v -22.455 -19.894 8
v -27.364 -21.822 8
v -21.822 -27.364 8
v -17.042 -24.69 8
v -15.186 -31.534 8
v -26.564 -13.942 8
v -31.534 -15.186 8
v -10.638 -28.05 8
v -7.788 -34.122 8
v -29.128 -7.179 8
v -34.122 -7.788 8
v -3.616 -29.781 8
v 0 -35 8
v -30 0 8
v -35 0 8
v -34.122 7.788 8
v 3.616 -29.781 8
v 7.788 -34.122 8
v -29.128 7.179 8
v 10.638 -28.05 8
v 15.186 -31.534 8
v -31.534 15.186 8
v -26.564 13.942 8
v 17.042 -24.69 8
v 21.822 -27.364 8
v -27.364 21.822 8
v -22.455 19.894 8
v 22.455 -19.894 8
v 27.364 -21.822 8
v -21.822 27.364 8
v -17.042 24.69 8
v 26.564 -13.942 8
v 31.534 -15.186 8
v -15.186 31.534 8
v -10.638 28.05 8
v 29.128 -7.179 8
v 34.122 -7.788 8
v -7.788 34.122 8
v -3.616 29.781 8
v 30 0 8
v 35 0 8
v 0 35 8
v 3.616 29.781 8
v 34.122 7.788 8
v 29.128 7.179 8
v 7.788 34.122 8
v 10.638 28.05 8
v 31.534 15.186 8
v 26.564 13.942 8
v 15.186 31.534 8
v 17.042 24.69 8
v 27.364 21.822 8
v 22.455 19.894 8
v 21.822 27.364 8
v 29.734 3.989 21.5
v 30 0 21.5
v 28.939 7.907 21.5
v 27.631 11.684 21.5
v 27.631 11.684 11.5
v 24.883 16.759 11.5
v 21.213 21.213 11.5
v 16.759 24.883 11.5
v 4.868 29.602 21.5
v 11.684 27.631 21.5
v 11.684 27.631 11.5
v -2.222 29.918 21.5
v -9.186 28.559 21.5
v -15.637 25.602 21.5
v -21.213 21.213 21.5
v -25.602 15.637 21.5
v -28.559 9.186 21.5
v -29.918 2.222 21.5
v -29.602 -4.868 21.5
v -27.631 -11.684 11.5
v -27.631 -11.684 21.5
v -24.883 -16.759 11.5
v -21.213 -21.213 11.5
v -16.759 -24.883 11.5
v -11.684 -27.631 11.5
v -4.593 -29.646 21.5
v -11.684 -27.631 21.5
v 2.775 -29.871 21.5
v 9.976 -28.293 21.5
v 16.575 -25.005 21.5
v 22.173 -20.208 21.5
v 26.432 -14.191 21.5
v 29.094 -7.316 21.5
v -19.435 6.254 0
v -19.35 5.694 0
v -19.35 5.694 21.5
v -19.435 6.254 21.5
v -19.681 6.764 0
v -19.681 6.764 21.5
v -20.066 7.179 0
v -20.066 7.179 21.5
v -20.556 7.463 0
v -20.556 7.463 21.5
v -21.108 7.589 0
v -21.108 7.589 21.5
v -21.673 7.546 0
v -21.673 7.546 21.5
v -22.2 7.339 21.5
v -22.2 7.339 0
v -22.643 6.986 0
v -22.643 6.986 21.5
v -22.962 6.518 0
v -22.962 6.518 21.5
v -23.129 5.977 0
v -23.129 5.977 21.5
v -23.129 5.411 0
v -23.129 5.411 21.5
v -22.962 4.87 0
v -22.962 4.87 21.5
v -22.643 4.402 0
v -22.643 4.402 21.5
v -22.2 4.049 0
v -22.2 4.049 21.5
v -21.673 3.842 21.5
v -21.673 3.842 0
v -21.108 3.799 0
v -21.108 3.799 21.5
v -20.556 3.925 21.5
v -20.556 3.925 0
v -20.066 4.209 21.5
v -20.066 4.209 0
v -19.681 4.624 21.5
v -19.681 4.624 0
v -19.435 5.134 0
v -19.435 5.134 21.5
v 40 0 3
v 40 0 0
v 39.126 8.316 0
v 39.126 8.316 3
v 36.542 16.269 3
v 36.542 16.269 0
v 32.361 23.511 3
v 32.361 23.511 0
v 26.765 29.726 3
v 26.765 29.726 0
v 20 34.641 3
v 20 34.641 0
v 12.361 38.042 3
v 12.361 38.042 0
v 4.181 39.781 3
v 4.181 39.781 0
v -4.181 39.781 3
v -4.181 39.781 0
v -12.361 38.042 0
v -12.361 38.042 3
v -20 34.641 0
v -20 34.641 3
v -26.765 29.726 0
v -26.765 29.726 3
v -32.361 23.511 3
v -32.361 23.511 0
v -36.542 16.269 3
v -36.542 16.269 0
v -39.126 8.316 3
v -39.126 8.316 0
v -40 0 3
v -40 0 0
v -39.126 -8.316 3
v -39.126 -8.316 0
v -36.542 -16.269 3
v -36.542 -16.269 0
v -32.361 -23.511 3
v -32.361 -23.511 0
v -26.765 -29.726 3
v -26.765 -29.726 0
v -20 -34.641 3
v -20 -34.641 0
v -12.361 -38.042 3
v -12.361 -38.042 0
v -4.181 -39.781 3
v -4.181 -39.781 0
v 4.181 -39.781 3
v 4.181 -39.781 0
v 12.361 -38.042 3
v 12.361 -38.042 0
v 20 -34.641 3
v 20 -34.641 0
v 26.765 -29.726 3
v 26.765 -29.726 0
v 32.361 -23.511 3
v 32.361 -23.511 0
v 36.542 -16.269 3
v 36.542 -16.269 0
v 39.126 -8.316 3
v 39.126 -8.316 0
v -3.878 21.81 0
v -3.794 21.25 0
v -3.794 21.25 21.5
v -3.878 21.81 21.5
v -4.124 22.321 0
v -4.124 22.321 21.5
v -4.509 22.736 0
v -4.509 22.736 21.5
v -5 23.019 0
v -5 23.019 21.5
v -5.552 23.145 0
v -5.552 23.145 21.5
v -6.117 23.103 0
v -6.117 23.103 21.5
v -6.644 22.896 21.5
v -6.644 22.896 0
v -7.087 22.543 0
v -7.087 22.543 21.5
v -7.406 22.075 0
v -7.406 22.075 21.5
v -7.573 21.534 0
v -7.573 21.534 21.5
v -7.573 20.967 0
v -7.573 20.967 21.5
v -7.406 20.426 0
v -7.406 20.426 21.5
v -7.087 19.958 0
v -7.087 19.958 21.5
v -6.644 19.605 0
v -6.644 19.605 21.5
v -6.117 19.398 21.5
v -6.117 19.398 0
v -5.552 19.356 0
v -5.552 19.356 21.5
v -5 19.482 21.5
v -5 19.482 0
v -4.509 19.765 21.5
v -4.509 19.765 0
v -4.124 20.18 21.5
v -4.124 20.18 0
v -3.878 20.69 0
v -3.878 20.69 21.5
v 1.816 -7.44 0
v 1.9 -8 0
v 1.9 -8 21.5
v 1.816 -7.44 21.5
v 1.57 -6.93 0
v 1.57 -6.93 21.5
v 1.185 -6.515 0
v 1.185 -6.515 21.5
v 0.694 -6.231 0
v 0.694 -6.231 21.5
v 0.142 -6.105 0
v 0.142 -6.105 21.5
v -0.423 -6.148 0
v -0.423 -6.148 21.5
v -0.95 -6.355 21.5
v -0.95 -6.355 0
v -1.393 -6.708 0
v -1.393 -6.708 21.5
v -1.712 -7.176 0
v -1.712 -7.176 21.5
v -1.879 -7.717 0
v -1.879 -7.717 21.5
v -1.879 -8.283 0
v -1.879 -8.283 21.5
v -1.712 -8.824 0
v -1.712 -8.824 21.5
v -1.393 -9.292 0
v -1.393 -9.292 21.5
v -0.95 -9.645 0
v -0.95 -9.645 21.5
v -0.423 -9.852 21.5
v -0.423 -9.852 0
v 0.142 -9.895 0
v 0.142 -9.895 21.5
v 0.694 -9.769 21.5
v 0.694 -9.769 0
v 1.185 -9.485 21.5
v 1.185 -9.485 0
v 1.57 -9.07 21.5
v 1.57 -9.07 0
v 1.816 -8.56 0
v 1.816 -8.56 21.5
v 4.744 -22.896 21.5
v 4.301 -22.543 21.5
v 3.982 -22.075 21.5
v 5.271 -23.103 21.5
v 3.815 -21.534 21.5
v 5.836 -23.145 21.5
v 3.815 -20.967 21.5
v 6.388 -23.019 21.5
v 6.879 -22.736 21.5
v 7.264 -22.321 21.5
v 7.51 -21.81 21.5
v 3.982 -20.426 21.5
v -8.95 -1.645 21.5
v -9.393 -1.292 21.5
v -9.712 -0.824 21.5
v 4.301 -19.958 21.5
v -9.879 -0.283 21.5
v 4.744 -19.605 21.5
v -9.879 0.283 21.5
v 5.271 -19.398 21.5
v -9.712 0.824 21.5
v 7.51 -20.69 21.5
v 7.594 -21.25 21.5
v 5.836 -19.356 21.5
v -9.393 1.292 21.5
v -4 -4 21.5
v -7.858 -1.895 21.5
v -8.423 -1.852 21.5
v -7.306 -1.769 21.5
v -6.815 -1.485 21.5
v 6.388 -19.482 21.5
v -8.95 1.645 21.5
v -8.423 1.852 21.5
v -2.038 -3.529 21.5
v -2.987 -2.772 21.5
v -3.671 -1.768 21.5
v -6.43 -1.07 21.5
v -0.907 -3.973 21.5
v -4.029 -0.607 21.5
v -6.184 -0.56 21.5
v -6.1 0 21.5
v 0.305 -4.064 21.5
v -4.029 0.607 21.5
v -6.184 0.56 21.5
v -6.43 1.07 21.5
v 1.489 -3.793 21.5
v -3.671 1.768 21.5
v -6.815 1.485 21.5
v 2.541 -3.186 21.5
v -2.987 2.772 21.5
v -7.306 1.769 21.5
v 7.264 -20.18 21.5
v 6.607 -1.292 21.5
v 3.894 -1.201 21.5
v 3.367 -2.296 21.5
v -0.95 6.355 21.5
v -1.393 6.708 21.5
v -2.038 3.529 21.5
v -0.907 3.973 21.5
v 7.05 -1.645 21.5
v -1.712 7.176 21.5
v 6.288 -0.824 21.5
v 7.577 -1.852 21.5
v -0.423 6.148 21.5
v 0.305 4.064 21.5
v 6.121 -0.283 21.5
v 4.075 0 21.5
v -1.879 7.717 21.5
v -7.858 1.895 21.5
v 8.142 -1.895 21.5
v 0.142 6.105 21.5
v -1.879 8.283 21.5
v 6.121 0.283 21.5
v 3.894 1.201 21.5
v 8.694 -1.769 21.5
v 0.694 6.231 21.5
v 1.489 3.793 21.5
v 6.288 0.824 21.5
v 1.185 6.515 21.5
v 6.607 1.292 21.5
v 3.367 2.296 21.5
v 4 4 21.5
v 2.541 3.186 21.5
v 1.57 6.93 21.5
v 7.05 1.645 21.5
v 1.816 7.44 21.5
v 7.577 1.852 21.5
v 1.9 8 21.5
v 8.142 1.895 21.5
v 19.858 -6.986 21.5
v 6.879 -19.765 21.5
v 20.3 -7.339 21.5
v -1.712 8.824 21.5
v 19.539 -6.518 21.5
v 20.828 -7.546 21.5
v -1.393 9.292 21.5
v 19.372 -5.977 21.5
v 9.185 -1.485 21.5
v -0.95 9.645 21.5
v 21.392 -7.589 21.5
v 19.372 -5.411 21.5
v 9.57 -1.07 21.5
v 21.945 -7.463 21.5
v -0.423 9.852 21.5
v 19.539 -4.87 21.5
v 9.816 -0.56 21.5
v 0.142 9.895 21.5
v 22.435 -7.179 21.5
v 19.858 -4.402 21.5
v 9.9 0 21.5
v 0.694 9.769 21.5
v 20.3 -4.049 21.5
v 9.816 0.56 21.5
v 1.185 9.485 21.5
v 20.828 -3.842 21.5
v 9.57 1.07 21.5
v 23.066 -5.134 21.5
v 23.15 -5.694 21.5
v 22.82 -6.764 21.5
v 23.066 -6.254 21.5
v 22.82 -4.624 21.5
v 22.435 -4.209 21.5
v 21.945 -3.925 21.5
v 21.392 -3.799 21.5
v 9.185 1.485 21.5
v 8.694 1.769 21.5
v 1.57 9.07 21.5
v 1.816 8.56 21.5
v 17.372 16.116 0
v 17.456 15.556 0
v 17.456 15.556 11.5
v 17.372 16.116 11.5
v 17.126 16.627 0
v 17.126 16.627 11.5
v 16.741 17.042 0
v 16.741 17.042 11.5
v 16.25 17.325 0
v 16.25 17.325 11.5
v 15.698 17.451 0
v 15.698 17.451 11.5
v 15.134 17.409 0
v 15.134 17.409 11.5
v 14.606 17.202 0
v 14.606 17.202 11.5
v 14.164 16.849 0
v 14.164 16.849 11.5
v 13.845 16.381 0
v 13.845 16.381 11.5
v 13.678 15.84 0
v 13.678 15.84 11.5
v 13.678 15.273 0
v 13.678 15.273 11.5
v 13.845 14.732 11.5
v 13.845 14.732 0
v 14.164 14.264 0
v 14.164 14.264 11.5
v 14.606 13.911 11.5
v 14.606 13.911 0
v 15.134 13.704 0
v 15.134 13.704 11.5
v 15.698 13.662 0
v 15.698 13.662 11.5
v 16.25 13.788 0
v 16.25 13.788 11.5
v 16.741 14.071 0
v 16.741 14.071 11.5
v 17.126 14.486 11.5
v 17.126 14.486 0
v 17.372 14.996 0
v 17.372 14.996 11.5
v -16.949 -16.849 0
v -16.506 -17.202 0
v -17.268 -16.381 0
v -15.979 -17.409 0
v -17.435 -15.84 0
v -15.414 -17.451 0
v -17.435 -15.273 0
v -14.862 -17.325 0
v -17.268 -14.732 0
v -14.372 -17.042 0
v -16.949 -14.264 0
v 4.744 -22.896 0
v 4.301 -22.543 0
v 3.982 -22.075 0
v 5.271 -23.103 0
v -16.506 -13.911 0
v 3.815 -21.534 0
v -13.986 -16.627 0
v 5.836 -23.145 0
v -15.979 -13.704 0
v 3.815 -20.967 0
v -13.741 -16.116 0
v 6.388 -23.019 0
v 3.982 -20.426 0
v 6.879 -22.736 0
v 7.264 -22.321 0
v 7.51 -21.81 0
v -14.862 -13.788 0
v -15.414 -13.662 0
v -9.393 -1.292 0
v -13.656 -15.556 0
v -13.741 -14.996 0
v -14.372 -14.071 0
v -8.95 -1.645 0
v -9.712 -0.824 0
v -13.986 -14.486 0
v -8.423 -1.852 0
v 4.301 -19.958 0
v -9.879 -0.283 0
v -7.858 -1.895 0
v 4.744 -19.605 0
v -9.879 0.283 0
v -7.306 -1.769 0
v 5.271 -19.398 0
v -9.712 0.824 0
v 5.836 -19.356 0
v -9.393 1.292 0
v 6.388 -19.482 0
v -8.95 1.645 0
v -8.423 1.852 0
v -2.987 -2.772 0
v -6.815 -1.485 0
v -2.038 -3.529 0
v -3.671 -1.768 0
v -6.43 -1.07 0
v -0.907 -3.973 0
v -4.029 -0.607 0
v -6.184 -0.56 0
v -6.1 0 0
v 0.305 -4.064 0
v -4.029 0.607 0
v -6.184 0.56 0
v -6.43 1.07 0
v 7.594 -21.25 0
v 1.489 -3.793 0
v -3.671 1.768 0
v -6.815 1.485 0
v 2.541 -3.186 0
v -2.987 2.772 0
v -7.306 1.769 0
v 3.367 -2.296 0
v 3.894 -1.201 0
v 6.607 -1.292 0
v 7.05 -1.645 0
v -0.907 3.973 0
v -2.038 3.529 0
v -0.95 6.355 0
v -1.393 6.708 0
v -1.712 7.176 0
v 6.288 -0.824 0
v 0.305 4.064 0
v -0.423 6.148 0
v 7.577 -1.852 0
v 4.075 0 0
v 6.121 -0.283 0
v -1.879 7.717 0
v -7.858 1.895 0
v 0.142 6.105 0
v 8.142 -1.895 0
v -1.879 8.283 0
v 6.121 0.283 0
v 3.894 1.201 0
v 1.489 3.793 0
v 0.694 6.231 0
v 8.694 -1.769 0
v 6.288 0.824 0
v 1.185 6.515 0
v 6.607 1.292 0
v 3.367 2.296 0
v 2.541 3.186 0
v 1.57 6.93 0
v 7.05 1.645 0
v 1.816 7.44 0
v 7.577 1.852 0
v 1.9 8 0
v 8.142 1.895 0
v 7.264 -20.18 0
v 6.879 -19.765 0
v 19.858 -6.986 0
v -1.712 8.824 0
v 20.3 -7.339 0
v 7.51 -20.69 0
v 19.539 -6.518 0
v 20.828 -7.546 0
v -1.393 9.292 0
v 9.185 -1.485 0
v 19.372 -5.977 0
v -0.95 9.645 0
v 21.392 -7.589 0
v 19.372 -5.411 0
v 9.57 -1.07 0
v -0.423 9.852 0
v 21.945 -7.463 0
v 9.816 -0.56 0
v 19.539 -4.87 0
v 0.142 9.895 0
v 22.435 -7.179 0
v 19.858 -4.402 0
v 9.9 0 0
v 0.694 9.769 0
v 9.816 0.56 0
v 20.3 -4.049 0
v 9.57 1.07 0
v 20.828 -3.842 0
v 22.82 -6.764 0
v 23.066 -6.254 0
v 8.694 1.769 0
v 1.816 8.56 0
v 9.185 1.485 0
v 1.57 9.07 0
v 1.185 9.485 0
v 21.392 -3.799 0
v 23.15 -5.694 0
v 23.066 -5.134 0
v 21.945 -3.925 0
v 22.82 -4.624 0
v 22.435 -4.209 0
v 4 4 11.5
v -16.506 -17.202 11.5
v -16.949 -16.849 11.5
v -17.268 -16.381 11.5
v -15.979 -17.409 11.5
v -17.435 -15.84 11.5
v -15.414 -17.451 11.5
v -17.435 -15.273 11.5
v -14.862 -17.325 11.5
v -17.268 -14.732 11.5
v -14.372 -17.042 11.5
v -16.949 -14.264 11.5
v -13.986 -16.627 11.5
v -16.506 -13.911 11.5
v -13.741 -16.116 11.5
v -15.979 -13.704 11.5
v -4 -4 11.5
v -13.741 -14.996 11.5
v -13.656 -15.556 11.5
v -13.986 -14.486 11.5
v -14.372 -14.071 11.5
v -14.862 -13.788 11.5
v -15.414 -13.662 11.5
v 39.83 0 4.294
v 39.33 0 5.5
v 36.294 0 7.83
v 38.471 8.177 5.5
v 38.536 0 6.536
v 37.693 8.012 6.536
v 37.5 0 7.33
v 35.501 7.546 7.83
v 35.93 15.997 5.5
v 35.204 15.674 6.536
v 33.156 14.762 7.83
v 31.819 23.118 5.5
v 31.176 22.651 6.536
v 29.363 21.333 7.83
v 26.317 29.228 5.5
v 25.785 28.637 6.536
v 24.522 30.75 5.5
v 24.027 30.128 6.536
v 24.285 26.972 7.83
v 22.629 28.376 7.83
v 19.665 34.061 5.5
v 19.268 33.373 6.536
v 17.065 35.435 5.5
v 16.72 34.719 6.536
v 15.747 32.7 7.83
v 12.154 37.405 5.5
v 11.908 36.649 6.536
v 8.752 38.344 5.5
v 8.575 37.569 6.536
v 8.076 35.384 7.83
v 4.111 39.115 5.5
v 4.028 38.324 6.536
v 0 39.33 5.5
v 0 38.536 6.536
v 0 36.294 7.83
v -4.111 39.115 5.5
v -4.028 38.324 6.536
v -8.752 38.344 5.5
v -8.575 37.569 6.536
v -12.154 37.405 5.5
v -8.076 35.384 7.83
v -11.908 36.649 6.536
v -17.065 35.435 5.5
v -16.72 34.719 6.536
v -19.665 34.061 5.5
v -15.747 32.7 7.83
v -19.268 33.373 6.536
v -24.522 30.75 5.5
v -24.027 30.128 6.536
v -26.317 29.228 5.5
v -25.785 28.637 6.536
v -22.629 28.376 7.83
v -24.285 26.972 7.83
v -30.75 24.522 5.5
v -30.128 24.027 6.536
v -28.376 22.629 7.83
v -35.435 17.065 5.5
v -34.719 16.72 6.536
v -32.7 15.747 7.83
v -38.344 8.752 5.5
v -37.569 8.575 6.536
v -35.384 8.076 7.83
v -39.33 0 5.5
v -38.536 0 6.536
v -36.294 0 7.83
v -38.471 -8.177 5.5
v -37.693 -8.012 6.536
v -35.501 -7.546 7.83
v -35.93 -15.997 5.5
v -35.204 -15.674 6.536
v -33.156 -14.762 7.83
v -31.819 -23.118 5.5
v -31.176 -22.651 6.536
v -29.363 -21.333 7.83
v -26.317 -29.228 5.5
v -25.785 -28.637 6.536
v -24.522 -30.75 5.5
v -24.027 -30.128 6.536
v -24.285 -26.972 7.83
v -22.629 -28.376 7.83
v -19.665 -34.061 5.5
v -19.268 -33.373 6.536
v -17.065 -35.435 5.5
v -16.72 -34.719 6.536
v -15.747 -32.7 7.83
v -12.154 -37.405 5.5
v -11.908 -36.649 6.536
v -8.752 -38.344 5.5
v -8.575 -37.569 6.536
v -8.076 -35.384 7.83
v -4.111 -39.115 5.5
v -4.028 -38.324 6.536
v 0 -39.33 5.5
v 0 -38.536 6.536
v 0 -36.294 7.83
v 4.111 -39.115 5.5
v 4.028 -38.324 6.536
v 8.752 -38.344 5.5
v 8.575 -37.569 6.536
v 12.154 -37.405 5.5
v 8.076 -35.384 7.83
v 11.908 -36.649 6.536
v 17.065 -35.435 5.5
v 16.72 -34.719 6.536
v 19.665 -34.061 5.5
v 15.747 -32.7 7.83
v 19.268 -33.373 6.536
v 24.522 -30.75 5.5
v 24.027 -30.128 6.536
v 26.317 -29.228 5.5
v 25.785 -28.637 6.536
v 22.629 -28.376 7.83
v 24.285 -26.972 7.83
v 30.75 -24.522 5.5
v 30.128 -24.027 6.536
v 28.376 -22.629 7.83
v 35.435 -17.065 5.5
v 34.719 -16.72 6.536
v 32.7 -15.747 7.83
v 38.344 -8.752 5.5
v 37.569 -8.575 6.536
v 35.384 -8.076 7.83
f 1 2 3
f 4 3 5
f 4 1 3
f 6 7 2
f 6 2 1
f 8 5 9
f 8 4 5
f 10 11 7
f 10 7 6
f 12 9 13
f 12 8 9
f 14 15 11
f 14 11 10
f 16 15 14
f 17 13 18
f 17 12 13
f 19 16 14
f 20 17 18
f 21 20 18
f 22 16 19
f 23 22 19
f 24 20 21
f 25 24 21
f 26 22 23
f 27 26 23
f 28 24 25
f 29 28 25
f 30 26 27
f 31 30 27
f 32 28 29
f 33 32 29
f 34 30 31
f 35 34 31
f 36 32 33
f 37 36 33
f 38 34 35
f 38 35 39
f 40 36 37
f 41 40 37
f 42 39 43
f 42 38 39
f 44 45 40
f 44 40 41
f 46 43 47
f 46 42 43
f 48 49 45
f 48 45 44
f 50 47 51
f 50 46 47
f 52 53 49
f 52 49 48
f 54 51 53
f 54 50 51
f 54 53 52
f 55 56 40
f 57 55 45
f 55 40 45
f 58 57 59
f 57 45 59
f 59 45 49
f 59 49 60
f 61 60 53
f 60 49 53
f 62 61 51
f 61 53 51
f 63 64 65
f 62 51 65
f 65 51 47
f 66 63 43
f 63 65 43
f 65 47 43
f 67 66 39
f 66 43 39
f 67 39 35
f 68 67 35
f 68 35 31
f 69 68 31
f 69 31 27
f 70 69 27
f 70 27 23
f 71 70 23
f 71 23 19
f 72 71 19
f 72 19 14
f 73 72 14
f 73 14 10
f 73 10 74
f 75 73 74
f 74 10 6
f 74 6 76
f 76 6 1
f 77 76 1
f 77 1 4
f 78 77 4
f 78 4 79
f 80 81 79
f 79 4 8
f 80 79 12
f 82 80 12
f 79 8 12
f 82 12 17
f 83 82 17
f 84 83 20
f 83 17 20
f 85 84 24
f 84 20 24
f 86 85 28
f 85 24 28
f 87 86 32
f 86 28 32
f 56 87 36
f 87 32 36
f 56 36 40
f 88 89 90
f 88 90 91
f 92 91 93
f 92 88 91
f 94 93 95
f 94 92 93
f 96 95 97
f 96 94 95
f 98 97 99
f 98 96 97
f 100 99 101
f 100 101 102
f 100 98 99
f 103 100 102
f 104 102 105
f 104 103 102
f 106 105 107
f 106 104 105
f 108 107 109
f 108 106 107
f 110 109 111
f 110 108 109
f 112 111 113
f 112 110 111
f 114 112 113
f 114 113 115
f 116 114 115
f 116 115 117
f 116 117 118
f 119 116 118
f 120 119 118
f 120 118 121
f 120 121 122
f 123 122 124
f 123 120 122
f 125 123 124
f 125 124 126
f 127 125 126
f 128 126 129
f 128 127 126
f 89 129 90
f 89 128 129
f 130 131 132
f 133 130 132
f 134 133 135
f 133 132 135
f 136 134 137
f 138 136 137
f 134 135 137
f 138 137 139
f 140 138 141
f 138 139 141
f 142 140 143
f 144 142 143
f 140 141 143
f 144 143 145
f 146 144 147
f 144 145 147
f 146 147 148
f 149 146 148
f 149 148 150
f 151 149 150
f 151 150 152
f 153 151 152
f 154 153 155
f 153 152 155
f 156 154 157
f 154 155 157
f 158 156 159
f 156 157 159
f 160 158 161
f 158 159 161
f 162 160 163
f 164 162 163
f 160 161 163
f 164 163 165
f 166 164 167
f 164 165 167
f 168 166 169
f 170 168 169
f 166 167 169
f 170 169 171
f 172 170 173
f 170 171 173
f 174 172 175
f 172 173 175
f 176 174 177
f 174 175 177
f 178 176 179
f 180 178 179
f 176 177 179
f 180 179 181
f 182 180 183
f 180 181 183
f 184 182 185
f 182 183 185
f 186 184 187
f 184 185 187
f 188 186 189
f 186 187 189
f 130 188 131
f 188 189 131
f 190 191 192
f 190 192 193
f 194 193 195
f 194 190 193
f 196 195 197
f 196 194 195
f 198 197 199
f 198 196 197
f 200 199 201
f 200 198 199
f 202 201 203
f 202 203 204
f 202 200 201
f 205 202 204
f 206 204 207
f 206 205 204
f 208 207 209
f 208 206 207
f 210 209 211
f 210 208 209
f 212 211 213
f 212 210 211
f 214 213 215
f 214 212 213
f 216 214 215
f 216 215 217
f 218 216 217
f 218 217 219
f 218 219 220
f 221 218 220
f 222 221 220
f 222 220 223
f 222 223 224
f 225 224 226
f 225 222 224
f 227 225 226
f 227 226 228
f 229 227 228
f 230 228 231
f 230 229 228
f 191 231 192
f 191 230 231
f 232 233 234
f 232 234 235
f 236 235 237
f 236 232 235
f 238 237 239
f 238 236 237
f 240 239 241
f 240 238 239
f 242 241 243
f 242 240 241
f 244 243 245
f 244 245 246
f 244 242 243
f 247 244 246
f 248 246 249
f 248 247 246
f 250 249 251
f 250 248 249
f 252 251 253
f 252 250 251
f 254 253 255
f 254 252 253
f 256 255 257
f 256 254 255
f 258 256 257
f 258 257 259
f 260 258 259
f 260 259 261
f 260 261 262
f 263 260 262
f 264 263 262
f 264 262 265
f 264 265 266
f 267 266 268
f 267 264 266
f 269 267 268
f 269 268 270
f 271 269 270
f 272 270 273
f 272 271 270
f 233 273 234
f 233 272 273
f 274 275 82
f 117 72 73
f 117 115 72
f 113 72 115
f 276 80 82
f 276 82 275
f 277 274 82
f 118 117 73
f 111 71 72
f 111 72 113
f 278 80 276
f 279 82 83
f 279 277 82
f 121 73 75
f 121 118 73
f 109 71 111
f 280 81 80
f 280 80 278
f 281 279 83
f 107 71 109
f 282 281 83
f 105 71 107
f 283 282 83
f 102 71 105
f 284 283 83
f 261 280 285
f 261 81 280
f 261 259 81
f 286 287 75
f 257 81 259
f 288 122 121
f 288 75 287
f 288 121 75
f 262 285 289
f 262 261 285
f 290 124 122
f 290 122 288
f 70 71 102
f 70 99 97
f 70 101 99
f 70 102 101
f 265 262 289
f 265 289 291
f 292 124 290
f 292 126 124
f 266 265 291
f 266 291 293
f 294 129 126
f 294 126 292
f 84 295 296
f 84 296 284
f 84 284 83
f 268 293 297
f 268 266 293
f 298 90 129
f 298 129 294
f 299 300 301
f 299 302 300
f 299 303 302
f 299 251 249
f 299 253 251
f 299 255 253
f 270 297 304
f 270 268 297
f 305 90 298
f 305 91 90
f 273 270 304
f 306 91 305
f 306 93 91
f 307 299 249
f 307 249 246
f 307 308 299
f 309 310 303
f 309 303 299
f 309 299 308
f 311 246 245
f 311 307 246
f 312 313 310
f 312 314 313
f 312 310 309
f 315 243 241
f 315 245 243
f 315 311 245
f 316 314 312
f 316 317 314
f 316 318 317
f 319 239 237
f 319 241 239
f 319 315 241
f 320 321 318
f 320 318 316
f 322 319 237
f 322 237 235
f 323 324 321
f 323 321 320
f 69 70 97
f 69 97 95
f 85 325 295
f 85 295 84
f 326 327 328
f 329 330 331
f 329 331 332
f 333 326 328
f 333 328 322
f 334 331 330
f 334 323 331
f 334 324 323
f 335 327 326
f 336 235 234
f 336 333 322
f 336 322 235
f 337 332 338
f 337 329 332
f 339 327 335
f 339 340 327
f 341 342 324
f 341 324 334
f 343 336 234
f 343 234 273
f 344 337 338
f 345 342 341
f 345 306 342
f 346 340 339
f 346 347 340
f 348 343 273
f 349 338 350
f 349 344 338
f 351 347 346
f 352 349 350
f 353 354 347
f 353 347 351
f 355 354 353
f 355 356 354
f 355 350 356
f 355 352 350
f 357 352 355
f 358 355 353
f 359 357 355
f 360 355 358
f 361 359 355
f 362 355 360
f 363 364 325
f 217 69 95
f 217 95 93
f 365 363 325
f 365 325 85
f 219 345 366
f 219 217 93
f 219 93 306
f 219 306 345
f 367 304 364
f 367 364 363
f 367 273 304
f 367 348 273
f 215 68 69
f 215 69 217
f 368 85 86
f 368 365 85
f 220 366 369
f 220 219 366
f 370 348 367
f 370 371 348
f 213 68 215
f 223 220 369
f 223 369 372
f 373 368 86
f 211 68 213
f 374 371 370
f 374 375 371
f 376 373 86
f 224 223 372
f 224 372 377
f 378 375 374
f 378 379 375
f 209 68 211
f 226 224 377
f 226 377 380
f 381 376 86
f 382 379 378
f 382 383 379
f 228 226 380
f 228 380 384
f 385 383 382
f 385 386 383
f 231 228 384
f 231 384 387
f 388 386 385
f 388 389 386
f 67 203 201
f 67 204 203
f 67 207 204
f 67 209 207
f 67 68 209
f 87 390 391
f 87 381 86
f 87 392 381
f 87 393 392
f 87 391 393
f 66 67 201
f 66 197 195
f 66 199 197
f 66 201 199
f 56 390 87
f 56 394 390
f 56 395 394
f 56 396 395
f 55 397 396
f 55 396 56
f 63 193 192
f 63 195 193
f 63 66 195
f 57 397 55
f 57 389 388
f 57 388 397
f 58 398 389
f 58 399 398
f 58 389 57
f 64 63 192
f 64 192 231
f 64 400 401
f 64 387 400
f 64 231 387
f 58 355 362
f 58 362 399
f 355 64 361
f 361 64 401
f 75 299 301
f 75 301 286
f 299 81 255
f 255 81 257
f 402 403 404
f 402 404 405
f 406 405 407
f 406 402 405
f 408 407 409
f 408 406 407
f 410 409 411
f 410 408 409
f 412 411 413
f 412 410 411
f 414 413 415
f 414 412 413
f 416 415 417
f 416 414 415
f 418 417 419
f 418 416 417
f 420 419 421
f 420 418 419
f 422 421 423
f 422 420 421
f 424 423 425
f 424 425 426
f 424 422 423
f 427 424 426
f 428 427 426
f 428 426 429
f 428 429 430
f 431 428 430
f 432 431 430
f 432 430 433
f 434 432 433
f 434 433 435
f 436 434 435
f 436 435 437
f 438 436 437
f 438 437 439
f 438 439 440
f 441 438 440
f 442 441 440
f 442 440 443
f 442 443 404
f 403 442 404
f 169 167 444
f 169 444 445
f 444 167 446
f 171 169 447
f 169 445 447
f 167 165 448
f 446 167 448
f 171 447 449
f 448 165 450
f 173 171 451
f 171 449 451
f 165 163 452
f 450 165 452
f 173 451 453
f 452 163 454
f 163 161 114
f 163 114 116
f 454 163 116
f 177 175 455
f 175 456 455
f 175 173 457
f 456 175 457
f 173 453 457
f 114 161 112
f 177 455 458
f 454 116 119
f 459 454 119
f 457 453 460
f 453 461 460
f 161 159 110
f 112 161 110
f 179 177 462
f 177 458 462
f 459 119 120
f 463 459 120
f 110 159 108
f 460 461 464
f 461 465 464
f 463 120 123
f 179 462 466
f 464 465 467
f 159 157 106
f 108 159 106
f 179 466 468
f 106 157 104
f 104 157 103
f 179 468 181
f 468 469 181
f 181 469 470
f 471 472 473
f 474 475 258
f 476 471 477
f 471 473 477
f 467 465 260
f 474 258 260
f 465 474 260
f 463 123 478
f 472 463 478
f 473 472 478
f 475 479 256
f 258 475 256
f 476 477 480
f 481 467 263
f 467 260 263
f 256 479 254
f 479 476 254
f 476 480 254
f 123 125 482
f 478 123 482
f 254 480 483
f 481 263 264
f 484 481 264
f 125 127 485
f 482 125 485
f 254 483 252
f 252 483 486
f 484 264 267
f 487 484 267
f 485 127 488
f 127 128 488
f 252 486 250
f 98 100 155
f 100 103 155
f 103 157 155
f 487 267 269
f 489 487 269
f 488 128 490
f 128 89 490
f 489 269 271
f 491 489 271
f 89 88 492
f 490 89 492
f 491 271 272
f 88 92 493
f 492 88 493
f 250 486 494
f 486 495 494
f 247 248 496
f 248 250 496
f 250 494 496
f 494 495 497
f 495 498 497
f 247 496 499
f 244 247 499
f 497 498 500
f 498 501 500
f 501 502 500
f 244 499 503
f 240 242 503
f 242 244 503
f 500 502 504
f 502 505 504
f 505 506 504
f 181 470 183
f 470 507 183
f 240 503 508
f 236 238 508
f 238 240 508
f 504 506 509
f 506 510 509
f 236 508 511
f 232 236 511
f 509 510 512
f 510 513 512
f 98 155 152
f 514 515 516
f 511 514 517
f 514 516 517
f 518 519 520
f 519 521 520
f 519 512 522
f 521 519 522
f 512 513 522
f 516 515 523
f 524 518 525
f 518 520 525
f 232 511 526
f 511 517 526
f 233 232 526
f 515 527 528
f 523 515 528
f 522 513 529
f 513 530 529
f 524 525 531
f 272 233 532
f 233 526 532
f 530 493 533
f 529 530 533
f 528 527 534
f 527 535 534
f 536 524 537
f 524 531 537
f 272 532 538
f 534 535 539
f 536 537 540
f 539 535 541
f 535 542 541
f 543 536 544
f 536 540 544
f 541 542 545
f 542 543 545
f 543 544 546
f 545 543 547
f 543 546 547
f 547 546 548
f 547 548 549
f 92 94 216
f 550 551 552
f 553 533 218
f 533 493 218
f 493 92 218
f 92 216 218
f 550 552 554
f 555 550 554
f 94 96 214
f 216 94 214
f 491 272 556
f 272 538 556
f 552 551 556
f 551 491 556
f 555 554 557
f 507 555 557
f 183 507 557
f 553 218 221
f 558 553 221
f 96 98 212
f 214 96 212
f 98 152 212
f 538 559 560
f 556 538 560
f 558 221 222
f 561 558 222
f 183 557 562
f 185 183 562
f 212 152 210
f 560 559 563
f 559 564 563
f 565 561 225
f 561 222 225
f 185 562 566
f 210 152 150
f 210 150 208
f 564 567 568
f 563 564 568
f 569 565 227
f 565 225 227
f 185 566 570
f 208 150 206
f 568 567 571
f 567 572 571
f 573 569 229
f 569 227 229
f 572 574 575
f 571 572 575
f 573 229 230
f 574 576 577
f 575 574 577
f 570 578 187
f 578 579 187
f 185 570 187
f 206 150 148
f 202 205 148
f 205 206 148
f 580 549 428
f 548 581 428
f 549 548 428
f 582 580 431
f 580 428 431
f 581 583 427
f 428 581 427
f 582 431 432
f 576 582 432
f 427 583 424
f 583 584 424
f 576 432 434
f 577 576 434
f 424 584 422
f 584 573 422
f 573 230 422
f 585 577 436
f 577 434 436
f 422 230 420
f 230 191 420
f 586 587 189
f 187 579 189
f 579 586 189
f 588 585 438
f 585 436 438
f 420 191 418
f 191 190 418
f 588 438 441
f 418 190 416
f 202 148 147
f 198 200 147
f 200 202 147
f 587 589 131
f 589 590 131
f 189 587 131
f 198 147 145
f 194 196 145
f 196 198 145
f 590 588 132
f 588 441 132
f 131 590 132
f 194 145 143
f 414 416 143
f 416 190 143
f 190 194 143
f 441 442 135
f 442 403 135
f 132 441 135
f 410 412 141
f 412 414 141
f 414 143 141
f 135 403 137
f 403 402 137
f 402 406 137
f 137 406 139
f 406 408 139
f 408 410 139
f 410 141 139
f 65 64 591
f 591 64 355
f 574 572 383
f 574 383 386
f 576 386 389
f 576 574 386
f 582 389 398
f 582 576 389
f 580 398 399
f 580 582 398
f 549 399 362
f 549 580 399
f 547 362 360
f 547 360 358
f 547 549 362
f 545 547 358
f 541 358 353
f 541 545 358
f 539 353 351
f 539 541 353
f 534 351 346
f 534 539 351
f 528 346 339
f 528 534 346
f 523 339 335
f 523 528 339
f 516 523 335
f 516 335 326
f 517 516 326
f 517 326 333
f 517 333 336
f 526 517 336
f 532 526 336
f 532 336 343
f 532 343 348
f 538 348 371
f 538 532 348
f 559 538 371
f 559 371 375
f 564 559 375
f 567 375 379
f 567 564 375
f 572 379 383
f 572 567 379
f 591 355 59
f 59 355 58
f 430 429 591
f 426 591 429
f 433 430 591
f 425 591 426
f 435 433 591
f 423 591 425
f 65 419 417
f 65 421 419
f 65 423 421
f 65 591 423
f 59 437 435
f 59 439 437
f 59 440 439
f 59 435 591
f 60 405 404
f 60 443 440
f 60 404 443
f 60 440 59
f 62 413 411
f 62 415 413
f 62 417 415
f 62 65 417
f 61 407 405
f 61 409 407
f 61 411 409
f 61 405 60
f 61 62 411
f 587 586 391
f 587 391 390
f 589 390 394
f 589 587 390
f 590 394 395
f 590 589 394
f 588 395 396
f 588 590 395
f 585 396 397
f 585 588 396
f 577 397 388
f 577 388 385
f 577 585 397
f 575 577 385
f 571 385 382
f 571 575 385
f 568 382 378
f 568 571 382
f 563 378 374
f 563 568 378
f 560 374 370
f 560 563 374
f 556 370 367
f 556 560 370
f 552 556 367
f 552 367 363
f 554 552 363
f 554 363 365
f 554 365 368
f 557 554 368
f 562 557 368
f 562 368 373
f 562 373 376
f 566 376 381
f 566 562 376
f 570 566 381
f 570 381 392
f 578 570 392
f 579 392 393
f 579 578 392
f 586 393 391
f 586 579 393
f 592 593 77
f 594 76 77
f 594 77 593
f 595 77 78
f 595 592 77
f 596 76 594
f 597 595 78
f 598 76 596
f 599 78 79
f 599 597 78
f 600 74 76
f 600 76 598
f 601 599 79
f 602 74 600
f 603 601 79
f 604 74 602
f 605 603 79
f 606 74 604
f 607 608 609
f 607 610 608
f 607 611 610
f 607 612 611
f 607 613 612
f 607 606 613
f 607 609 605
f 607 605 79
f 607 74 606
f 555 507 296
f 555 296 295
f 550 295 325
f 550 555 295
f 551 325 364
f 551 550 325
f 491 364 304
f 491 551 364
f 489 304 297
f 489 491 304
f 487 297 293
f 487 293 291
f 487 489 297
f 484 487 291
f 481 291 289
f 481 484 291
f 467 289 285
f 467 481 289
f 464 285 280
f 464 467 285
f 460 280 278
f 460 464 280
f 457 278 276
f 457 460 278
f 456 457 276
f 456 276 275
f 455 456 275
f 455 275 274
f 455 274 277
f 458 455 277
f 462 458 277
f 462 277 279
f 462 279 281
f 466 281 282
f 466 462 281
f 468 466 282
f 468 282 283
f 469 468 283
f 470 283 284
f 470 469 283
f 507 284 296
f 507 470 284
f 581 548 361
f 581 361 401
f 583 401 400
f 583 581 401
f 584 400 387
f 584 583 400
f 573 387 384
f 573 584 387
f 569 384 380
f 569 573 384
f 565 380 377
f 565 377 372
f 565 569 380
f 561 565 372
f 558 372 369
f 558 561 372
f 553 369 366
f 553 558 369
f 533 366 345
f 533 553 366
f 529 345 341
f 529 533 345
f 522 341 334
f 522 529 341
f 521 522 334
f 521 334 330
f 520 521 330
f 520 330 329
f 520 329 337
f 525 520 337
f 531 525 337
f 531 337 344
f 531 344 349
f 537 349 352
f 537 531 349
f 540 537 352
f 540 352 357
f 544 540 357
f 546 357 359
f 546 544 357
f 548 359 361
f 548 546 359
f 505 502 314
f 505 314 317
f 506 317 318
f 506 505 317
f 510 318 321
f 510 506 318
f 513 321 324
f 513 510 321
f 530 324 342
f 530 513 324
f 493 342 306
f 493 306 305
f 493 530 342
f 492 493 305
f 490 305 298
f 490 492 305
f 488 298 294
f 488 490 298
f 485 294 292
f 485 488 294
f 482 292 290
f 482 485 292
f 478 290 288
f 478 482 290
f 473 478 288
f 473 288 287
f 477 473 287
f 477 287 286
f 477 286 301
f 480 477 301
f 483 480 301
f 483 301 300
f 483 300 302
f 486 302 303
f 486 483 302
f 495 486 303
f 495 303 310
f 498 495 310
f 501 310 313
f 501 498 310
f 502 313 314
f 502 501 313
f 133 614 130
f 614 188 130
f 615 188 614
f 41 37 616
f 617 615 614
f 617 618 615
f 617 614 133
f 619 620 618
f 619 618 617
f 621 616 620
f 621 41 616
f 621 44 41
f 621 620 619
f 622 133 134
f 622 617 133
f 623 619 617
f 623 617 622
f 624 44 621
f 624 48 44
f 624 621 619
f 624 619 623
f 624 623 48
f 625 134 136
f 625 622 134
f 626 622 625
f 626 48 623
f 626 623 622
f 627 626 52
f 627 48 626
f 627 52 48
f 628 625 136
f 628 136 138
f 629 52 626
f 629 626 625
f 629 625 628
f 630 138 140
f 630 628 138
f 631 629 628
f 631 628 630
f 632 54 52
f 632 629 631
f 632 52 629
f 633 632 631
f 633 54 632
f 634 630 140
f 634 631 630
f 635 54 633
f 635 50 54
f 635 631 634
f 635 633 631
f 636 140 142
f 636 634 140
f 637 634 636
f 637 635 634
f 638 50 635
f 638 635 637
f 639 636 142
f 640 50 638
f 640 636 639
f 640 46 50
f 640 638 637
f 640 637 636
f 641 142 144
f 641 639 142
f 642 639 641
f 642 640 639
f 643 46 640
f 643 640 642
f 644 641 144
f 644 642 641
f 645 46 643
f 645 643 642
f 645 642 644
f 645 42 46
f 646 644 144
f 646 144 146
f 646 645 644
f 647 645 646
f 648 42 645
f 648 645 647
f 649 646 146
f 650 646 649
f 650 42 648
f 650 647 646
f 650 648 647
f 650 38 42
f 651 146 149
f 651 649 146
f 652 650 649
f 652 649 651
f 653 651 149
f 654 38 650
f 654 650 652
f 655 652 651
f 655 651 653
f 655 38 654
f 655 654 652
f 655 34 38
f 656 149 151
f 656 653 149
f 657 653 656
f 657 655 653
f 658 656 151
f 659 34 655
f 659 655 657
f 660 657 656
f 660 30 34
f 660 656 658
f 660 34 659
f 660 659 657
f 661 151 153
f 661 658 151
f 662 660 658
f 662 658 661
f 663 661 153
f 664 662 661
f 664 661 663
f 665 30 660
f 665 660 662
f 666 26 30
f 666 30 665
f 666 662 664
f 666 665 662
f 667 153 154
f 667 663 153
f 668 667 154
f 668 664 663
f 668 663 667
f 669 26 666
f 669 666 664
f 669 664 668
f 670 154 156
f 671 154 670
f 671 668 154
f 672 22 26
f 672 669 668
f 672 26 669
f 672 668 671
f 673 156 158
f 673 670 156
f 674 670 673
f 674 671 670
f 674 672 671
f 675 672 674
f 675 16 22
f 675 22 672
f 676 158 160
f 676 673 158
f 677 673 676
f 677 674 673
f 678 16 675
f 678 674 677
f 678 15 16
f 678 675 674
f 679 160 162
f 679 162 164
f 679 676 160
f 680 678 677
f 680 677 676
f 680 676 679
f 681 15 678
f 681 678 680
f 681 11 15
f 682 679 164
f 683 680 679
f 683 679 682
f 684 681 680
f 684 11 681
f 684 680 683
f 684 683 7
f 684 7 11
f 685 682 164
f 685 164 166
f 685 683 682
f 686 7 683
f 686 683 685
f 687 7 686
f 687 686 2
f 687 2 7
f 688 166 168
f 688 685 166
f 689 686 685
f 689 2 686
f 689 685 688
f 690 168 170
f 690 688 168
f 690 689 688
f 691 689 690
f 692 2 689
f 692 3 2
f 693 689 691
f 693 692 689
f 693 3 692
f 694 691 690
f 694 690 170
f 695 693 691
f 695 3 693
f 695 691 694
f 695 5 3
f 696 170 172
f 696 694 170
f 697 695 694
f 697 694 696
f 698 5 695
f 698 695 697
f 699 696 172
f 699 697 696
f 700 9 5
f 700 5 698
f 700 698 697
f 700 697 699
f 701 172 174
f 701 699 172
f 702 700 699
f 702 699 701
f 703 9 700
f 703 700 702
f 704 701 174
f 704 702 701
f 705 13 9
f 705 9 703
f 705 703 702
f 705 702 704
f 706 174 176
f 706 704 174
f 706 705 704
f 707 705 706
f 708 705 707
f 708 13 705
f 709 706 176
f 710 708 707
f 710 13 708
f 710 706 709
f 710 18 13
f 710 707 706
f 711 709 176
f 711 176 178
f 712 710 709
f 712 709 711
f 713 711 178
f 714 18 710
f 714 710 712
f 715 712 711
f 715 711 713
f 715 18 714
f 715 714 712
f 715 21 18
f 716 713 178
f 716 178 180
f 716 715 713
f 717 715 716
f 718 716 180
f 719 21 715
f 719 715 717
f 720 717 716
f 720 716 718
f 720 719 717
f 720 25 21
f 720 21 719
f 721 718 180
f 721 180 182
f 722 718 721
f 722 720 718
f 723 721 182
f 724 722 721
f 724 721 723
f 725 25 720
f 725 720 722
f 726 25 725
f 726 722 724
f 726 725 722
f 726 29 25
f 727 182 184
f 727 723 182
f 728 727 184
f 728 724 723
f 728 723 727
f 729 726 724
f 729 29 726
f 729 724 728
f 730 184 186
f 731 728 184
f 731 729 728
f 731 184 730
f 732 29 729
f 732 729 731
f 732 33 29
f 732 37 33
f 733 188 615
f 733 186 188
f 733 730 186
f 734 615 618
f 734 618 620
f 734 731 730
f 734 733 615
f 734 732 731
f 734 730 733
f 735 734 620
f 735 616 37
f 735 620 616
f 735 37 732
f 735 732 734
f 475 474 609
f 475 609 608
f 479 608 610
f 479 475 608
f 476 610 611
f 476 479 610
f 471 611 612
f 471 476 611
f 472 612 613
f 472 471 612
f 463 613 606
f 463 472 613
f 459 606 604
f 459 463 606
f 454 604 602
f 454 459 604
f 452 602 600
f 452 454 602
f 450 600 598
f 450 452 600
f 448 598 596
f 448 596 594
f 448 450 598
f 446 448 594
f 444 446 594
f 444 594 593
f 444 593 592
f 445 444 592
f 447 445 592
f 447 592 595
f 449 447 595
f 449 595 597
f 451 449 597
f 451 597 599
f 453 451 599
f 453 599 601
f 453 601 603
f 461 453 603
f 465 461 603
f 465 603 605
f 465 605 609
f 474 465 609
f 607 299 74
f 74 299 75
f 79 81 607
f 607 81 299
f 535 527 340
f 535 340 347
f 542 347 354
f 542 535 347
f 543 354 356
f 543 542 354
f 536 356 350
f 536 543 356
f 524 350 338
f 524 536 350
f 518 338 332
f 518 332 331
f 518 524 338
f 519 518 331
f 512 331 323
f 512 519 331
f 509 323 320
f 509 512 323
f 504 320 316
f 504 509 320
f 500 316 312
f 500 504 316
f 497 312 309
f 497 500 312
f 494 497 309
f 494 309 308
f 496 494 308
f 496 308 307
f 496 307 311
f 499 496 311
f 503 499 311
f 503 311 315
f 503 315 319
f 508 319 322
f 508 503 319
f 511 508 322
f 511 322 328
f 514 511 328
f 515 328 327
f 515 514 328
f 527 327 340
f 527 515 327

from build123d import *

# Parameters (mm, degrees)
F0_R     = 30
F0_R_2   = 1.9
F0_R_3   = 4.075
F1_DEPTH = 21.5
F0_R_4   = 40
F2_DEPTH = 8
F3_R     = 1.9
F4_DEPTH = 10
F5_R     = 5


with BuildPart() as f1:
    # F0 (on Top) → F1 (new body)
    with BuildSketch(Plane.XY):
        Circle(F0_R)
        with Locations((-15.5563491861, -15.5563491861)):
            Circle(F0_R_2, mode=Mode.SUBTRACT)
        with Locations((5.6940189923, -21.2503681784)):
            Circle(F0_R_2, mode=Mode.SUBTRACT)
        with Locations((0, -8)):
            Circle(F0_R_2, mode=Mode.SUBTRACT)
        with Locations((21.2503681784, -5.6940189923)):
            Circle(F0_R_2, mode=Mode.SUBTRACT)
        with Locations((-21.2503681784, 5.6940189923)):
            Circle(F0_R_2, mode=Mode.SUBTRACT)
        with Locations((-8, 0)):
            Circle(F0_R_2, mode=Mode.SUBTRACT)
        with Locations((-5.6940189923, 21.2503681784)):
            Circle(F0_R_2, mode=Mode.SUBTRACT)
        Circle(F0_R_3, mode=Mode.SUBTRACT)
        with Locations((8, 0)):
            Circle(F0_R_2, mode=Mode.SUBTRACT)
        with Locations((0, 8)):
            Circle(F0_R_2, mode=Mode.SUBTRACT)
        with Locations((15.5563491861, 15.5563491861)):
            Circle(F0_R_2, mode=Mode.SUBTRACT)
    extrude(amount=F1_DEPTH)

    # F0 (on Top) → F2 (join)
    with BuildSketch(Plane.XY):
        Circle(F0_R_4)
        Circle(F0_R, mode=Mode.SUBTRACT)
    extrude(amount=F2_DEPTH)

    # F3 (on face) → F4 (cut)
    with BuildSketch(Plane.XY.offset(21.5)):
        with BuildLine():
            Line((-11.6844405683, -27.6310305382), (-4, -4))
            Line((-4, -4), (-27.6310305382, -11.6844405683))
            ThreePointArc((-27.6310305382, -11.6844405683), (-21.2132034356, -21.2132034356), (-11.6844405683, -27.6310305382))
        make_face()
        with Locations((-15.5563491861, -15.5563491861)):
            Circle(F3_R, mode=Mode.SUBTRACT)
        with BuildLine():
            ThreePointArc((27.6310305382, 11.6844405683), (21.2132034356, 21.2132034356), (11.6844405683, 27.6310305382))
            Line((11.6844405683, 27.6310305382), (4, 4))
            Line((4, 4), (27.6310305382, 11.6844405683))
        make_face()
        with Locations((15.5563491861, 15.5563491861)):
            Circle(F3_R, mode=Mode.SUBTRACT)
    extrude(amount=-F4_DEPTH, mode=Mode.SUBTRACT)

    # F5
    f5_edges = [f1.edges().sort_by_distance(p)[0] for p in [
        (-40, 0, 8),
    ]]
    fillet(f5_edges, radius=F5_R)


solid = f1.part
